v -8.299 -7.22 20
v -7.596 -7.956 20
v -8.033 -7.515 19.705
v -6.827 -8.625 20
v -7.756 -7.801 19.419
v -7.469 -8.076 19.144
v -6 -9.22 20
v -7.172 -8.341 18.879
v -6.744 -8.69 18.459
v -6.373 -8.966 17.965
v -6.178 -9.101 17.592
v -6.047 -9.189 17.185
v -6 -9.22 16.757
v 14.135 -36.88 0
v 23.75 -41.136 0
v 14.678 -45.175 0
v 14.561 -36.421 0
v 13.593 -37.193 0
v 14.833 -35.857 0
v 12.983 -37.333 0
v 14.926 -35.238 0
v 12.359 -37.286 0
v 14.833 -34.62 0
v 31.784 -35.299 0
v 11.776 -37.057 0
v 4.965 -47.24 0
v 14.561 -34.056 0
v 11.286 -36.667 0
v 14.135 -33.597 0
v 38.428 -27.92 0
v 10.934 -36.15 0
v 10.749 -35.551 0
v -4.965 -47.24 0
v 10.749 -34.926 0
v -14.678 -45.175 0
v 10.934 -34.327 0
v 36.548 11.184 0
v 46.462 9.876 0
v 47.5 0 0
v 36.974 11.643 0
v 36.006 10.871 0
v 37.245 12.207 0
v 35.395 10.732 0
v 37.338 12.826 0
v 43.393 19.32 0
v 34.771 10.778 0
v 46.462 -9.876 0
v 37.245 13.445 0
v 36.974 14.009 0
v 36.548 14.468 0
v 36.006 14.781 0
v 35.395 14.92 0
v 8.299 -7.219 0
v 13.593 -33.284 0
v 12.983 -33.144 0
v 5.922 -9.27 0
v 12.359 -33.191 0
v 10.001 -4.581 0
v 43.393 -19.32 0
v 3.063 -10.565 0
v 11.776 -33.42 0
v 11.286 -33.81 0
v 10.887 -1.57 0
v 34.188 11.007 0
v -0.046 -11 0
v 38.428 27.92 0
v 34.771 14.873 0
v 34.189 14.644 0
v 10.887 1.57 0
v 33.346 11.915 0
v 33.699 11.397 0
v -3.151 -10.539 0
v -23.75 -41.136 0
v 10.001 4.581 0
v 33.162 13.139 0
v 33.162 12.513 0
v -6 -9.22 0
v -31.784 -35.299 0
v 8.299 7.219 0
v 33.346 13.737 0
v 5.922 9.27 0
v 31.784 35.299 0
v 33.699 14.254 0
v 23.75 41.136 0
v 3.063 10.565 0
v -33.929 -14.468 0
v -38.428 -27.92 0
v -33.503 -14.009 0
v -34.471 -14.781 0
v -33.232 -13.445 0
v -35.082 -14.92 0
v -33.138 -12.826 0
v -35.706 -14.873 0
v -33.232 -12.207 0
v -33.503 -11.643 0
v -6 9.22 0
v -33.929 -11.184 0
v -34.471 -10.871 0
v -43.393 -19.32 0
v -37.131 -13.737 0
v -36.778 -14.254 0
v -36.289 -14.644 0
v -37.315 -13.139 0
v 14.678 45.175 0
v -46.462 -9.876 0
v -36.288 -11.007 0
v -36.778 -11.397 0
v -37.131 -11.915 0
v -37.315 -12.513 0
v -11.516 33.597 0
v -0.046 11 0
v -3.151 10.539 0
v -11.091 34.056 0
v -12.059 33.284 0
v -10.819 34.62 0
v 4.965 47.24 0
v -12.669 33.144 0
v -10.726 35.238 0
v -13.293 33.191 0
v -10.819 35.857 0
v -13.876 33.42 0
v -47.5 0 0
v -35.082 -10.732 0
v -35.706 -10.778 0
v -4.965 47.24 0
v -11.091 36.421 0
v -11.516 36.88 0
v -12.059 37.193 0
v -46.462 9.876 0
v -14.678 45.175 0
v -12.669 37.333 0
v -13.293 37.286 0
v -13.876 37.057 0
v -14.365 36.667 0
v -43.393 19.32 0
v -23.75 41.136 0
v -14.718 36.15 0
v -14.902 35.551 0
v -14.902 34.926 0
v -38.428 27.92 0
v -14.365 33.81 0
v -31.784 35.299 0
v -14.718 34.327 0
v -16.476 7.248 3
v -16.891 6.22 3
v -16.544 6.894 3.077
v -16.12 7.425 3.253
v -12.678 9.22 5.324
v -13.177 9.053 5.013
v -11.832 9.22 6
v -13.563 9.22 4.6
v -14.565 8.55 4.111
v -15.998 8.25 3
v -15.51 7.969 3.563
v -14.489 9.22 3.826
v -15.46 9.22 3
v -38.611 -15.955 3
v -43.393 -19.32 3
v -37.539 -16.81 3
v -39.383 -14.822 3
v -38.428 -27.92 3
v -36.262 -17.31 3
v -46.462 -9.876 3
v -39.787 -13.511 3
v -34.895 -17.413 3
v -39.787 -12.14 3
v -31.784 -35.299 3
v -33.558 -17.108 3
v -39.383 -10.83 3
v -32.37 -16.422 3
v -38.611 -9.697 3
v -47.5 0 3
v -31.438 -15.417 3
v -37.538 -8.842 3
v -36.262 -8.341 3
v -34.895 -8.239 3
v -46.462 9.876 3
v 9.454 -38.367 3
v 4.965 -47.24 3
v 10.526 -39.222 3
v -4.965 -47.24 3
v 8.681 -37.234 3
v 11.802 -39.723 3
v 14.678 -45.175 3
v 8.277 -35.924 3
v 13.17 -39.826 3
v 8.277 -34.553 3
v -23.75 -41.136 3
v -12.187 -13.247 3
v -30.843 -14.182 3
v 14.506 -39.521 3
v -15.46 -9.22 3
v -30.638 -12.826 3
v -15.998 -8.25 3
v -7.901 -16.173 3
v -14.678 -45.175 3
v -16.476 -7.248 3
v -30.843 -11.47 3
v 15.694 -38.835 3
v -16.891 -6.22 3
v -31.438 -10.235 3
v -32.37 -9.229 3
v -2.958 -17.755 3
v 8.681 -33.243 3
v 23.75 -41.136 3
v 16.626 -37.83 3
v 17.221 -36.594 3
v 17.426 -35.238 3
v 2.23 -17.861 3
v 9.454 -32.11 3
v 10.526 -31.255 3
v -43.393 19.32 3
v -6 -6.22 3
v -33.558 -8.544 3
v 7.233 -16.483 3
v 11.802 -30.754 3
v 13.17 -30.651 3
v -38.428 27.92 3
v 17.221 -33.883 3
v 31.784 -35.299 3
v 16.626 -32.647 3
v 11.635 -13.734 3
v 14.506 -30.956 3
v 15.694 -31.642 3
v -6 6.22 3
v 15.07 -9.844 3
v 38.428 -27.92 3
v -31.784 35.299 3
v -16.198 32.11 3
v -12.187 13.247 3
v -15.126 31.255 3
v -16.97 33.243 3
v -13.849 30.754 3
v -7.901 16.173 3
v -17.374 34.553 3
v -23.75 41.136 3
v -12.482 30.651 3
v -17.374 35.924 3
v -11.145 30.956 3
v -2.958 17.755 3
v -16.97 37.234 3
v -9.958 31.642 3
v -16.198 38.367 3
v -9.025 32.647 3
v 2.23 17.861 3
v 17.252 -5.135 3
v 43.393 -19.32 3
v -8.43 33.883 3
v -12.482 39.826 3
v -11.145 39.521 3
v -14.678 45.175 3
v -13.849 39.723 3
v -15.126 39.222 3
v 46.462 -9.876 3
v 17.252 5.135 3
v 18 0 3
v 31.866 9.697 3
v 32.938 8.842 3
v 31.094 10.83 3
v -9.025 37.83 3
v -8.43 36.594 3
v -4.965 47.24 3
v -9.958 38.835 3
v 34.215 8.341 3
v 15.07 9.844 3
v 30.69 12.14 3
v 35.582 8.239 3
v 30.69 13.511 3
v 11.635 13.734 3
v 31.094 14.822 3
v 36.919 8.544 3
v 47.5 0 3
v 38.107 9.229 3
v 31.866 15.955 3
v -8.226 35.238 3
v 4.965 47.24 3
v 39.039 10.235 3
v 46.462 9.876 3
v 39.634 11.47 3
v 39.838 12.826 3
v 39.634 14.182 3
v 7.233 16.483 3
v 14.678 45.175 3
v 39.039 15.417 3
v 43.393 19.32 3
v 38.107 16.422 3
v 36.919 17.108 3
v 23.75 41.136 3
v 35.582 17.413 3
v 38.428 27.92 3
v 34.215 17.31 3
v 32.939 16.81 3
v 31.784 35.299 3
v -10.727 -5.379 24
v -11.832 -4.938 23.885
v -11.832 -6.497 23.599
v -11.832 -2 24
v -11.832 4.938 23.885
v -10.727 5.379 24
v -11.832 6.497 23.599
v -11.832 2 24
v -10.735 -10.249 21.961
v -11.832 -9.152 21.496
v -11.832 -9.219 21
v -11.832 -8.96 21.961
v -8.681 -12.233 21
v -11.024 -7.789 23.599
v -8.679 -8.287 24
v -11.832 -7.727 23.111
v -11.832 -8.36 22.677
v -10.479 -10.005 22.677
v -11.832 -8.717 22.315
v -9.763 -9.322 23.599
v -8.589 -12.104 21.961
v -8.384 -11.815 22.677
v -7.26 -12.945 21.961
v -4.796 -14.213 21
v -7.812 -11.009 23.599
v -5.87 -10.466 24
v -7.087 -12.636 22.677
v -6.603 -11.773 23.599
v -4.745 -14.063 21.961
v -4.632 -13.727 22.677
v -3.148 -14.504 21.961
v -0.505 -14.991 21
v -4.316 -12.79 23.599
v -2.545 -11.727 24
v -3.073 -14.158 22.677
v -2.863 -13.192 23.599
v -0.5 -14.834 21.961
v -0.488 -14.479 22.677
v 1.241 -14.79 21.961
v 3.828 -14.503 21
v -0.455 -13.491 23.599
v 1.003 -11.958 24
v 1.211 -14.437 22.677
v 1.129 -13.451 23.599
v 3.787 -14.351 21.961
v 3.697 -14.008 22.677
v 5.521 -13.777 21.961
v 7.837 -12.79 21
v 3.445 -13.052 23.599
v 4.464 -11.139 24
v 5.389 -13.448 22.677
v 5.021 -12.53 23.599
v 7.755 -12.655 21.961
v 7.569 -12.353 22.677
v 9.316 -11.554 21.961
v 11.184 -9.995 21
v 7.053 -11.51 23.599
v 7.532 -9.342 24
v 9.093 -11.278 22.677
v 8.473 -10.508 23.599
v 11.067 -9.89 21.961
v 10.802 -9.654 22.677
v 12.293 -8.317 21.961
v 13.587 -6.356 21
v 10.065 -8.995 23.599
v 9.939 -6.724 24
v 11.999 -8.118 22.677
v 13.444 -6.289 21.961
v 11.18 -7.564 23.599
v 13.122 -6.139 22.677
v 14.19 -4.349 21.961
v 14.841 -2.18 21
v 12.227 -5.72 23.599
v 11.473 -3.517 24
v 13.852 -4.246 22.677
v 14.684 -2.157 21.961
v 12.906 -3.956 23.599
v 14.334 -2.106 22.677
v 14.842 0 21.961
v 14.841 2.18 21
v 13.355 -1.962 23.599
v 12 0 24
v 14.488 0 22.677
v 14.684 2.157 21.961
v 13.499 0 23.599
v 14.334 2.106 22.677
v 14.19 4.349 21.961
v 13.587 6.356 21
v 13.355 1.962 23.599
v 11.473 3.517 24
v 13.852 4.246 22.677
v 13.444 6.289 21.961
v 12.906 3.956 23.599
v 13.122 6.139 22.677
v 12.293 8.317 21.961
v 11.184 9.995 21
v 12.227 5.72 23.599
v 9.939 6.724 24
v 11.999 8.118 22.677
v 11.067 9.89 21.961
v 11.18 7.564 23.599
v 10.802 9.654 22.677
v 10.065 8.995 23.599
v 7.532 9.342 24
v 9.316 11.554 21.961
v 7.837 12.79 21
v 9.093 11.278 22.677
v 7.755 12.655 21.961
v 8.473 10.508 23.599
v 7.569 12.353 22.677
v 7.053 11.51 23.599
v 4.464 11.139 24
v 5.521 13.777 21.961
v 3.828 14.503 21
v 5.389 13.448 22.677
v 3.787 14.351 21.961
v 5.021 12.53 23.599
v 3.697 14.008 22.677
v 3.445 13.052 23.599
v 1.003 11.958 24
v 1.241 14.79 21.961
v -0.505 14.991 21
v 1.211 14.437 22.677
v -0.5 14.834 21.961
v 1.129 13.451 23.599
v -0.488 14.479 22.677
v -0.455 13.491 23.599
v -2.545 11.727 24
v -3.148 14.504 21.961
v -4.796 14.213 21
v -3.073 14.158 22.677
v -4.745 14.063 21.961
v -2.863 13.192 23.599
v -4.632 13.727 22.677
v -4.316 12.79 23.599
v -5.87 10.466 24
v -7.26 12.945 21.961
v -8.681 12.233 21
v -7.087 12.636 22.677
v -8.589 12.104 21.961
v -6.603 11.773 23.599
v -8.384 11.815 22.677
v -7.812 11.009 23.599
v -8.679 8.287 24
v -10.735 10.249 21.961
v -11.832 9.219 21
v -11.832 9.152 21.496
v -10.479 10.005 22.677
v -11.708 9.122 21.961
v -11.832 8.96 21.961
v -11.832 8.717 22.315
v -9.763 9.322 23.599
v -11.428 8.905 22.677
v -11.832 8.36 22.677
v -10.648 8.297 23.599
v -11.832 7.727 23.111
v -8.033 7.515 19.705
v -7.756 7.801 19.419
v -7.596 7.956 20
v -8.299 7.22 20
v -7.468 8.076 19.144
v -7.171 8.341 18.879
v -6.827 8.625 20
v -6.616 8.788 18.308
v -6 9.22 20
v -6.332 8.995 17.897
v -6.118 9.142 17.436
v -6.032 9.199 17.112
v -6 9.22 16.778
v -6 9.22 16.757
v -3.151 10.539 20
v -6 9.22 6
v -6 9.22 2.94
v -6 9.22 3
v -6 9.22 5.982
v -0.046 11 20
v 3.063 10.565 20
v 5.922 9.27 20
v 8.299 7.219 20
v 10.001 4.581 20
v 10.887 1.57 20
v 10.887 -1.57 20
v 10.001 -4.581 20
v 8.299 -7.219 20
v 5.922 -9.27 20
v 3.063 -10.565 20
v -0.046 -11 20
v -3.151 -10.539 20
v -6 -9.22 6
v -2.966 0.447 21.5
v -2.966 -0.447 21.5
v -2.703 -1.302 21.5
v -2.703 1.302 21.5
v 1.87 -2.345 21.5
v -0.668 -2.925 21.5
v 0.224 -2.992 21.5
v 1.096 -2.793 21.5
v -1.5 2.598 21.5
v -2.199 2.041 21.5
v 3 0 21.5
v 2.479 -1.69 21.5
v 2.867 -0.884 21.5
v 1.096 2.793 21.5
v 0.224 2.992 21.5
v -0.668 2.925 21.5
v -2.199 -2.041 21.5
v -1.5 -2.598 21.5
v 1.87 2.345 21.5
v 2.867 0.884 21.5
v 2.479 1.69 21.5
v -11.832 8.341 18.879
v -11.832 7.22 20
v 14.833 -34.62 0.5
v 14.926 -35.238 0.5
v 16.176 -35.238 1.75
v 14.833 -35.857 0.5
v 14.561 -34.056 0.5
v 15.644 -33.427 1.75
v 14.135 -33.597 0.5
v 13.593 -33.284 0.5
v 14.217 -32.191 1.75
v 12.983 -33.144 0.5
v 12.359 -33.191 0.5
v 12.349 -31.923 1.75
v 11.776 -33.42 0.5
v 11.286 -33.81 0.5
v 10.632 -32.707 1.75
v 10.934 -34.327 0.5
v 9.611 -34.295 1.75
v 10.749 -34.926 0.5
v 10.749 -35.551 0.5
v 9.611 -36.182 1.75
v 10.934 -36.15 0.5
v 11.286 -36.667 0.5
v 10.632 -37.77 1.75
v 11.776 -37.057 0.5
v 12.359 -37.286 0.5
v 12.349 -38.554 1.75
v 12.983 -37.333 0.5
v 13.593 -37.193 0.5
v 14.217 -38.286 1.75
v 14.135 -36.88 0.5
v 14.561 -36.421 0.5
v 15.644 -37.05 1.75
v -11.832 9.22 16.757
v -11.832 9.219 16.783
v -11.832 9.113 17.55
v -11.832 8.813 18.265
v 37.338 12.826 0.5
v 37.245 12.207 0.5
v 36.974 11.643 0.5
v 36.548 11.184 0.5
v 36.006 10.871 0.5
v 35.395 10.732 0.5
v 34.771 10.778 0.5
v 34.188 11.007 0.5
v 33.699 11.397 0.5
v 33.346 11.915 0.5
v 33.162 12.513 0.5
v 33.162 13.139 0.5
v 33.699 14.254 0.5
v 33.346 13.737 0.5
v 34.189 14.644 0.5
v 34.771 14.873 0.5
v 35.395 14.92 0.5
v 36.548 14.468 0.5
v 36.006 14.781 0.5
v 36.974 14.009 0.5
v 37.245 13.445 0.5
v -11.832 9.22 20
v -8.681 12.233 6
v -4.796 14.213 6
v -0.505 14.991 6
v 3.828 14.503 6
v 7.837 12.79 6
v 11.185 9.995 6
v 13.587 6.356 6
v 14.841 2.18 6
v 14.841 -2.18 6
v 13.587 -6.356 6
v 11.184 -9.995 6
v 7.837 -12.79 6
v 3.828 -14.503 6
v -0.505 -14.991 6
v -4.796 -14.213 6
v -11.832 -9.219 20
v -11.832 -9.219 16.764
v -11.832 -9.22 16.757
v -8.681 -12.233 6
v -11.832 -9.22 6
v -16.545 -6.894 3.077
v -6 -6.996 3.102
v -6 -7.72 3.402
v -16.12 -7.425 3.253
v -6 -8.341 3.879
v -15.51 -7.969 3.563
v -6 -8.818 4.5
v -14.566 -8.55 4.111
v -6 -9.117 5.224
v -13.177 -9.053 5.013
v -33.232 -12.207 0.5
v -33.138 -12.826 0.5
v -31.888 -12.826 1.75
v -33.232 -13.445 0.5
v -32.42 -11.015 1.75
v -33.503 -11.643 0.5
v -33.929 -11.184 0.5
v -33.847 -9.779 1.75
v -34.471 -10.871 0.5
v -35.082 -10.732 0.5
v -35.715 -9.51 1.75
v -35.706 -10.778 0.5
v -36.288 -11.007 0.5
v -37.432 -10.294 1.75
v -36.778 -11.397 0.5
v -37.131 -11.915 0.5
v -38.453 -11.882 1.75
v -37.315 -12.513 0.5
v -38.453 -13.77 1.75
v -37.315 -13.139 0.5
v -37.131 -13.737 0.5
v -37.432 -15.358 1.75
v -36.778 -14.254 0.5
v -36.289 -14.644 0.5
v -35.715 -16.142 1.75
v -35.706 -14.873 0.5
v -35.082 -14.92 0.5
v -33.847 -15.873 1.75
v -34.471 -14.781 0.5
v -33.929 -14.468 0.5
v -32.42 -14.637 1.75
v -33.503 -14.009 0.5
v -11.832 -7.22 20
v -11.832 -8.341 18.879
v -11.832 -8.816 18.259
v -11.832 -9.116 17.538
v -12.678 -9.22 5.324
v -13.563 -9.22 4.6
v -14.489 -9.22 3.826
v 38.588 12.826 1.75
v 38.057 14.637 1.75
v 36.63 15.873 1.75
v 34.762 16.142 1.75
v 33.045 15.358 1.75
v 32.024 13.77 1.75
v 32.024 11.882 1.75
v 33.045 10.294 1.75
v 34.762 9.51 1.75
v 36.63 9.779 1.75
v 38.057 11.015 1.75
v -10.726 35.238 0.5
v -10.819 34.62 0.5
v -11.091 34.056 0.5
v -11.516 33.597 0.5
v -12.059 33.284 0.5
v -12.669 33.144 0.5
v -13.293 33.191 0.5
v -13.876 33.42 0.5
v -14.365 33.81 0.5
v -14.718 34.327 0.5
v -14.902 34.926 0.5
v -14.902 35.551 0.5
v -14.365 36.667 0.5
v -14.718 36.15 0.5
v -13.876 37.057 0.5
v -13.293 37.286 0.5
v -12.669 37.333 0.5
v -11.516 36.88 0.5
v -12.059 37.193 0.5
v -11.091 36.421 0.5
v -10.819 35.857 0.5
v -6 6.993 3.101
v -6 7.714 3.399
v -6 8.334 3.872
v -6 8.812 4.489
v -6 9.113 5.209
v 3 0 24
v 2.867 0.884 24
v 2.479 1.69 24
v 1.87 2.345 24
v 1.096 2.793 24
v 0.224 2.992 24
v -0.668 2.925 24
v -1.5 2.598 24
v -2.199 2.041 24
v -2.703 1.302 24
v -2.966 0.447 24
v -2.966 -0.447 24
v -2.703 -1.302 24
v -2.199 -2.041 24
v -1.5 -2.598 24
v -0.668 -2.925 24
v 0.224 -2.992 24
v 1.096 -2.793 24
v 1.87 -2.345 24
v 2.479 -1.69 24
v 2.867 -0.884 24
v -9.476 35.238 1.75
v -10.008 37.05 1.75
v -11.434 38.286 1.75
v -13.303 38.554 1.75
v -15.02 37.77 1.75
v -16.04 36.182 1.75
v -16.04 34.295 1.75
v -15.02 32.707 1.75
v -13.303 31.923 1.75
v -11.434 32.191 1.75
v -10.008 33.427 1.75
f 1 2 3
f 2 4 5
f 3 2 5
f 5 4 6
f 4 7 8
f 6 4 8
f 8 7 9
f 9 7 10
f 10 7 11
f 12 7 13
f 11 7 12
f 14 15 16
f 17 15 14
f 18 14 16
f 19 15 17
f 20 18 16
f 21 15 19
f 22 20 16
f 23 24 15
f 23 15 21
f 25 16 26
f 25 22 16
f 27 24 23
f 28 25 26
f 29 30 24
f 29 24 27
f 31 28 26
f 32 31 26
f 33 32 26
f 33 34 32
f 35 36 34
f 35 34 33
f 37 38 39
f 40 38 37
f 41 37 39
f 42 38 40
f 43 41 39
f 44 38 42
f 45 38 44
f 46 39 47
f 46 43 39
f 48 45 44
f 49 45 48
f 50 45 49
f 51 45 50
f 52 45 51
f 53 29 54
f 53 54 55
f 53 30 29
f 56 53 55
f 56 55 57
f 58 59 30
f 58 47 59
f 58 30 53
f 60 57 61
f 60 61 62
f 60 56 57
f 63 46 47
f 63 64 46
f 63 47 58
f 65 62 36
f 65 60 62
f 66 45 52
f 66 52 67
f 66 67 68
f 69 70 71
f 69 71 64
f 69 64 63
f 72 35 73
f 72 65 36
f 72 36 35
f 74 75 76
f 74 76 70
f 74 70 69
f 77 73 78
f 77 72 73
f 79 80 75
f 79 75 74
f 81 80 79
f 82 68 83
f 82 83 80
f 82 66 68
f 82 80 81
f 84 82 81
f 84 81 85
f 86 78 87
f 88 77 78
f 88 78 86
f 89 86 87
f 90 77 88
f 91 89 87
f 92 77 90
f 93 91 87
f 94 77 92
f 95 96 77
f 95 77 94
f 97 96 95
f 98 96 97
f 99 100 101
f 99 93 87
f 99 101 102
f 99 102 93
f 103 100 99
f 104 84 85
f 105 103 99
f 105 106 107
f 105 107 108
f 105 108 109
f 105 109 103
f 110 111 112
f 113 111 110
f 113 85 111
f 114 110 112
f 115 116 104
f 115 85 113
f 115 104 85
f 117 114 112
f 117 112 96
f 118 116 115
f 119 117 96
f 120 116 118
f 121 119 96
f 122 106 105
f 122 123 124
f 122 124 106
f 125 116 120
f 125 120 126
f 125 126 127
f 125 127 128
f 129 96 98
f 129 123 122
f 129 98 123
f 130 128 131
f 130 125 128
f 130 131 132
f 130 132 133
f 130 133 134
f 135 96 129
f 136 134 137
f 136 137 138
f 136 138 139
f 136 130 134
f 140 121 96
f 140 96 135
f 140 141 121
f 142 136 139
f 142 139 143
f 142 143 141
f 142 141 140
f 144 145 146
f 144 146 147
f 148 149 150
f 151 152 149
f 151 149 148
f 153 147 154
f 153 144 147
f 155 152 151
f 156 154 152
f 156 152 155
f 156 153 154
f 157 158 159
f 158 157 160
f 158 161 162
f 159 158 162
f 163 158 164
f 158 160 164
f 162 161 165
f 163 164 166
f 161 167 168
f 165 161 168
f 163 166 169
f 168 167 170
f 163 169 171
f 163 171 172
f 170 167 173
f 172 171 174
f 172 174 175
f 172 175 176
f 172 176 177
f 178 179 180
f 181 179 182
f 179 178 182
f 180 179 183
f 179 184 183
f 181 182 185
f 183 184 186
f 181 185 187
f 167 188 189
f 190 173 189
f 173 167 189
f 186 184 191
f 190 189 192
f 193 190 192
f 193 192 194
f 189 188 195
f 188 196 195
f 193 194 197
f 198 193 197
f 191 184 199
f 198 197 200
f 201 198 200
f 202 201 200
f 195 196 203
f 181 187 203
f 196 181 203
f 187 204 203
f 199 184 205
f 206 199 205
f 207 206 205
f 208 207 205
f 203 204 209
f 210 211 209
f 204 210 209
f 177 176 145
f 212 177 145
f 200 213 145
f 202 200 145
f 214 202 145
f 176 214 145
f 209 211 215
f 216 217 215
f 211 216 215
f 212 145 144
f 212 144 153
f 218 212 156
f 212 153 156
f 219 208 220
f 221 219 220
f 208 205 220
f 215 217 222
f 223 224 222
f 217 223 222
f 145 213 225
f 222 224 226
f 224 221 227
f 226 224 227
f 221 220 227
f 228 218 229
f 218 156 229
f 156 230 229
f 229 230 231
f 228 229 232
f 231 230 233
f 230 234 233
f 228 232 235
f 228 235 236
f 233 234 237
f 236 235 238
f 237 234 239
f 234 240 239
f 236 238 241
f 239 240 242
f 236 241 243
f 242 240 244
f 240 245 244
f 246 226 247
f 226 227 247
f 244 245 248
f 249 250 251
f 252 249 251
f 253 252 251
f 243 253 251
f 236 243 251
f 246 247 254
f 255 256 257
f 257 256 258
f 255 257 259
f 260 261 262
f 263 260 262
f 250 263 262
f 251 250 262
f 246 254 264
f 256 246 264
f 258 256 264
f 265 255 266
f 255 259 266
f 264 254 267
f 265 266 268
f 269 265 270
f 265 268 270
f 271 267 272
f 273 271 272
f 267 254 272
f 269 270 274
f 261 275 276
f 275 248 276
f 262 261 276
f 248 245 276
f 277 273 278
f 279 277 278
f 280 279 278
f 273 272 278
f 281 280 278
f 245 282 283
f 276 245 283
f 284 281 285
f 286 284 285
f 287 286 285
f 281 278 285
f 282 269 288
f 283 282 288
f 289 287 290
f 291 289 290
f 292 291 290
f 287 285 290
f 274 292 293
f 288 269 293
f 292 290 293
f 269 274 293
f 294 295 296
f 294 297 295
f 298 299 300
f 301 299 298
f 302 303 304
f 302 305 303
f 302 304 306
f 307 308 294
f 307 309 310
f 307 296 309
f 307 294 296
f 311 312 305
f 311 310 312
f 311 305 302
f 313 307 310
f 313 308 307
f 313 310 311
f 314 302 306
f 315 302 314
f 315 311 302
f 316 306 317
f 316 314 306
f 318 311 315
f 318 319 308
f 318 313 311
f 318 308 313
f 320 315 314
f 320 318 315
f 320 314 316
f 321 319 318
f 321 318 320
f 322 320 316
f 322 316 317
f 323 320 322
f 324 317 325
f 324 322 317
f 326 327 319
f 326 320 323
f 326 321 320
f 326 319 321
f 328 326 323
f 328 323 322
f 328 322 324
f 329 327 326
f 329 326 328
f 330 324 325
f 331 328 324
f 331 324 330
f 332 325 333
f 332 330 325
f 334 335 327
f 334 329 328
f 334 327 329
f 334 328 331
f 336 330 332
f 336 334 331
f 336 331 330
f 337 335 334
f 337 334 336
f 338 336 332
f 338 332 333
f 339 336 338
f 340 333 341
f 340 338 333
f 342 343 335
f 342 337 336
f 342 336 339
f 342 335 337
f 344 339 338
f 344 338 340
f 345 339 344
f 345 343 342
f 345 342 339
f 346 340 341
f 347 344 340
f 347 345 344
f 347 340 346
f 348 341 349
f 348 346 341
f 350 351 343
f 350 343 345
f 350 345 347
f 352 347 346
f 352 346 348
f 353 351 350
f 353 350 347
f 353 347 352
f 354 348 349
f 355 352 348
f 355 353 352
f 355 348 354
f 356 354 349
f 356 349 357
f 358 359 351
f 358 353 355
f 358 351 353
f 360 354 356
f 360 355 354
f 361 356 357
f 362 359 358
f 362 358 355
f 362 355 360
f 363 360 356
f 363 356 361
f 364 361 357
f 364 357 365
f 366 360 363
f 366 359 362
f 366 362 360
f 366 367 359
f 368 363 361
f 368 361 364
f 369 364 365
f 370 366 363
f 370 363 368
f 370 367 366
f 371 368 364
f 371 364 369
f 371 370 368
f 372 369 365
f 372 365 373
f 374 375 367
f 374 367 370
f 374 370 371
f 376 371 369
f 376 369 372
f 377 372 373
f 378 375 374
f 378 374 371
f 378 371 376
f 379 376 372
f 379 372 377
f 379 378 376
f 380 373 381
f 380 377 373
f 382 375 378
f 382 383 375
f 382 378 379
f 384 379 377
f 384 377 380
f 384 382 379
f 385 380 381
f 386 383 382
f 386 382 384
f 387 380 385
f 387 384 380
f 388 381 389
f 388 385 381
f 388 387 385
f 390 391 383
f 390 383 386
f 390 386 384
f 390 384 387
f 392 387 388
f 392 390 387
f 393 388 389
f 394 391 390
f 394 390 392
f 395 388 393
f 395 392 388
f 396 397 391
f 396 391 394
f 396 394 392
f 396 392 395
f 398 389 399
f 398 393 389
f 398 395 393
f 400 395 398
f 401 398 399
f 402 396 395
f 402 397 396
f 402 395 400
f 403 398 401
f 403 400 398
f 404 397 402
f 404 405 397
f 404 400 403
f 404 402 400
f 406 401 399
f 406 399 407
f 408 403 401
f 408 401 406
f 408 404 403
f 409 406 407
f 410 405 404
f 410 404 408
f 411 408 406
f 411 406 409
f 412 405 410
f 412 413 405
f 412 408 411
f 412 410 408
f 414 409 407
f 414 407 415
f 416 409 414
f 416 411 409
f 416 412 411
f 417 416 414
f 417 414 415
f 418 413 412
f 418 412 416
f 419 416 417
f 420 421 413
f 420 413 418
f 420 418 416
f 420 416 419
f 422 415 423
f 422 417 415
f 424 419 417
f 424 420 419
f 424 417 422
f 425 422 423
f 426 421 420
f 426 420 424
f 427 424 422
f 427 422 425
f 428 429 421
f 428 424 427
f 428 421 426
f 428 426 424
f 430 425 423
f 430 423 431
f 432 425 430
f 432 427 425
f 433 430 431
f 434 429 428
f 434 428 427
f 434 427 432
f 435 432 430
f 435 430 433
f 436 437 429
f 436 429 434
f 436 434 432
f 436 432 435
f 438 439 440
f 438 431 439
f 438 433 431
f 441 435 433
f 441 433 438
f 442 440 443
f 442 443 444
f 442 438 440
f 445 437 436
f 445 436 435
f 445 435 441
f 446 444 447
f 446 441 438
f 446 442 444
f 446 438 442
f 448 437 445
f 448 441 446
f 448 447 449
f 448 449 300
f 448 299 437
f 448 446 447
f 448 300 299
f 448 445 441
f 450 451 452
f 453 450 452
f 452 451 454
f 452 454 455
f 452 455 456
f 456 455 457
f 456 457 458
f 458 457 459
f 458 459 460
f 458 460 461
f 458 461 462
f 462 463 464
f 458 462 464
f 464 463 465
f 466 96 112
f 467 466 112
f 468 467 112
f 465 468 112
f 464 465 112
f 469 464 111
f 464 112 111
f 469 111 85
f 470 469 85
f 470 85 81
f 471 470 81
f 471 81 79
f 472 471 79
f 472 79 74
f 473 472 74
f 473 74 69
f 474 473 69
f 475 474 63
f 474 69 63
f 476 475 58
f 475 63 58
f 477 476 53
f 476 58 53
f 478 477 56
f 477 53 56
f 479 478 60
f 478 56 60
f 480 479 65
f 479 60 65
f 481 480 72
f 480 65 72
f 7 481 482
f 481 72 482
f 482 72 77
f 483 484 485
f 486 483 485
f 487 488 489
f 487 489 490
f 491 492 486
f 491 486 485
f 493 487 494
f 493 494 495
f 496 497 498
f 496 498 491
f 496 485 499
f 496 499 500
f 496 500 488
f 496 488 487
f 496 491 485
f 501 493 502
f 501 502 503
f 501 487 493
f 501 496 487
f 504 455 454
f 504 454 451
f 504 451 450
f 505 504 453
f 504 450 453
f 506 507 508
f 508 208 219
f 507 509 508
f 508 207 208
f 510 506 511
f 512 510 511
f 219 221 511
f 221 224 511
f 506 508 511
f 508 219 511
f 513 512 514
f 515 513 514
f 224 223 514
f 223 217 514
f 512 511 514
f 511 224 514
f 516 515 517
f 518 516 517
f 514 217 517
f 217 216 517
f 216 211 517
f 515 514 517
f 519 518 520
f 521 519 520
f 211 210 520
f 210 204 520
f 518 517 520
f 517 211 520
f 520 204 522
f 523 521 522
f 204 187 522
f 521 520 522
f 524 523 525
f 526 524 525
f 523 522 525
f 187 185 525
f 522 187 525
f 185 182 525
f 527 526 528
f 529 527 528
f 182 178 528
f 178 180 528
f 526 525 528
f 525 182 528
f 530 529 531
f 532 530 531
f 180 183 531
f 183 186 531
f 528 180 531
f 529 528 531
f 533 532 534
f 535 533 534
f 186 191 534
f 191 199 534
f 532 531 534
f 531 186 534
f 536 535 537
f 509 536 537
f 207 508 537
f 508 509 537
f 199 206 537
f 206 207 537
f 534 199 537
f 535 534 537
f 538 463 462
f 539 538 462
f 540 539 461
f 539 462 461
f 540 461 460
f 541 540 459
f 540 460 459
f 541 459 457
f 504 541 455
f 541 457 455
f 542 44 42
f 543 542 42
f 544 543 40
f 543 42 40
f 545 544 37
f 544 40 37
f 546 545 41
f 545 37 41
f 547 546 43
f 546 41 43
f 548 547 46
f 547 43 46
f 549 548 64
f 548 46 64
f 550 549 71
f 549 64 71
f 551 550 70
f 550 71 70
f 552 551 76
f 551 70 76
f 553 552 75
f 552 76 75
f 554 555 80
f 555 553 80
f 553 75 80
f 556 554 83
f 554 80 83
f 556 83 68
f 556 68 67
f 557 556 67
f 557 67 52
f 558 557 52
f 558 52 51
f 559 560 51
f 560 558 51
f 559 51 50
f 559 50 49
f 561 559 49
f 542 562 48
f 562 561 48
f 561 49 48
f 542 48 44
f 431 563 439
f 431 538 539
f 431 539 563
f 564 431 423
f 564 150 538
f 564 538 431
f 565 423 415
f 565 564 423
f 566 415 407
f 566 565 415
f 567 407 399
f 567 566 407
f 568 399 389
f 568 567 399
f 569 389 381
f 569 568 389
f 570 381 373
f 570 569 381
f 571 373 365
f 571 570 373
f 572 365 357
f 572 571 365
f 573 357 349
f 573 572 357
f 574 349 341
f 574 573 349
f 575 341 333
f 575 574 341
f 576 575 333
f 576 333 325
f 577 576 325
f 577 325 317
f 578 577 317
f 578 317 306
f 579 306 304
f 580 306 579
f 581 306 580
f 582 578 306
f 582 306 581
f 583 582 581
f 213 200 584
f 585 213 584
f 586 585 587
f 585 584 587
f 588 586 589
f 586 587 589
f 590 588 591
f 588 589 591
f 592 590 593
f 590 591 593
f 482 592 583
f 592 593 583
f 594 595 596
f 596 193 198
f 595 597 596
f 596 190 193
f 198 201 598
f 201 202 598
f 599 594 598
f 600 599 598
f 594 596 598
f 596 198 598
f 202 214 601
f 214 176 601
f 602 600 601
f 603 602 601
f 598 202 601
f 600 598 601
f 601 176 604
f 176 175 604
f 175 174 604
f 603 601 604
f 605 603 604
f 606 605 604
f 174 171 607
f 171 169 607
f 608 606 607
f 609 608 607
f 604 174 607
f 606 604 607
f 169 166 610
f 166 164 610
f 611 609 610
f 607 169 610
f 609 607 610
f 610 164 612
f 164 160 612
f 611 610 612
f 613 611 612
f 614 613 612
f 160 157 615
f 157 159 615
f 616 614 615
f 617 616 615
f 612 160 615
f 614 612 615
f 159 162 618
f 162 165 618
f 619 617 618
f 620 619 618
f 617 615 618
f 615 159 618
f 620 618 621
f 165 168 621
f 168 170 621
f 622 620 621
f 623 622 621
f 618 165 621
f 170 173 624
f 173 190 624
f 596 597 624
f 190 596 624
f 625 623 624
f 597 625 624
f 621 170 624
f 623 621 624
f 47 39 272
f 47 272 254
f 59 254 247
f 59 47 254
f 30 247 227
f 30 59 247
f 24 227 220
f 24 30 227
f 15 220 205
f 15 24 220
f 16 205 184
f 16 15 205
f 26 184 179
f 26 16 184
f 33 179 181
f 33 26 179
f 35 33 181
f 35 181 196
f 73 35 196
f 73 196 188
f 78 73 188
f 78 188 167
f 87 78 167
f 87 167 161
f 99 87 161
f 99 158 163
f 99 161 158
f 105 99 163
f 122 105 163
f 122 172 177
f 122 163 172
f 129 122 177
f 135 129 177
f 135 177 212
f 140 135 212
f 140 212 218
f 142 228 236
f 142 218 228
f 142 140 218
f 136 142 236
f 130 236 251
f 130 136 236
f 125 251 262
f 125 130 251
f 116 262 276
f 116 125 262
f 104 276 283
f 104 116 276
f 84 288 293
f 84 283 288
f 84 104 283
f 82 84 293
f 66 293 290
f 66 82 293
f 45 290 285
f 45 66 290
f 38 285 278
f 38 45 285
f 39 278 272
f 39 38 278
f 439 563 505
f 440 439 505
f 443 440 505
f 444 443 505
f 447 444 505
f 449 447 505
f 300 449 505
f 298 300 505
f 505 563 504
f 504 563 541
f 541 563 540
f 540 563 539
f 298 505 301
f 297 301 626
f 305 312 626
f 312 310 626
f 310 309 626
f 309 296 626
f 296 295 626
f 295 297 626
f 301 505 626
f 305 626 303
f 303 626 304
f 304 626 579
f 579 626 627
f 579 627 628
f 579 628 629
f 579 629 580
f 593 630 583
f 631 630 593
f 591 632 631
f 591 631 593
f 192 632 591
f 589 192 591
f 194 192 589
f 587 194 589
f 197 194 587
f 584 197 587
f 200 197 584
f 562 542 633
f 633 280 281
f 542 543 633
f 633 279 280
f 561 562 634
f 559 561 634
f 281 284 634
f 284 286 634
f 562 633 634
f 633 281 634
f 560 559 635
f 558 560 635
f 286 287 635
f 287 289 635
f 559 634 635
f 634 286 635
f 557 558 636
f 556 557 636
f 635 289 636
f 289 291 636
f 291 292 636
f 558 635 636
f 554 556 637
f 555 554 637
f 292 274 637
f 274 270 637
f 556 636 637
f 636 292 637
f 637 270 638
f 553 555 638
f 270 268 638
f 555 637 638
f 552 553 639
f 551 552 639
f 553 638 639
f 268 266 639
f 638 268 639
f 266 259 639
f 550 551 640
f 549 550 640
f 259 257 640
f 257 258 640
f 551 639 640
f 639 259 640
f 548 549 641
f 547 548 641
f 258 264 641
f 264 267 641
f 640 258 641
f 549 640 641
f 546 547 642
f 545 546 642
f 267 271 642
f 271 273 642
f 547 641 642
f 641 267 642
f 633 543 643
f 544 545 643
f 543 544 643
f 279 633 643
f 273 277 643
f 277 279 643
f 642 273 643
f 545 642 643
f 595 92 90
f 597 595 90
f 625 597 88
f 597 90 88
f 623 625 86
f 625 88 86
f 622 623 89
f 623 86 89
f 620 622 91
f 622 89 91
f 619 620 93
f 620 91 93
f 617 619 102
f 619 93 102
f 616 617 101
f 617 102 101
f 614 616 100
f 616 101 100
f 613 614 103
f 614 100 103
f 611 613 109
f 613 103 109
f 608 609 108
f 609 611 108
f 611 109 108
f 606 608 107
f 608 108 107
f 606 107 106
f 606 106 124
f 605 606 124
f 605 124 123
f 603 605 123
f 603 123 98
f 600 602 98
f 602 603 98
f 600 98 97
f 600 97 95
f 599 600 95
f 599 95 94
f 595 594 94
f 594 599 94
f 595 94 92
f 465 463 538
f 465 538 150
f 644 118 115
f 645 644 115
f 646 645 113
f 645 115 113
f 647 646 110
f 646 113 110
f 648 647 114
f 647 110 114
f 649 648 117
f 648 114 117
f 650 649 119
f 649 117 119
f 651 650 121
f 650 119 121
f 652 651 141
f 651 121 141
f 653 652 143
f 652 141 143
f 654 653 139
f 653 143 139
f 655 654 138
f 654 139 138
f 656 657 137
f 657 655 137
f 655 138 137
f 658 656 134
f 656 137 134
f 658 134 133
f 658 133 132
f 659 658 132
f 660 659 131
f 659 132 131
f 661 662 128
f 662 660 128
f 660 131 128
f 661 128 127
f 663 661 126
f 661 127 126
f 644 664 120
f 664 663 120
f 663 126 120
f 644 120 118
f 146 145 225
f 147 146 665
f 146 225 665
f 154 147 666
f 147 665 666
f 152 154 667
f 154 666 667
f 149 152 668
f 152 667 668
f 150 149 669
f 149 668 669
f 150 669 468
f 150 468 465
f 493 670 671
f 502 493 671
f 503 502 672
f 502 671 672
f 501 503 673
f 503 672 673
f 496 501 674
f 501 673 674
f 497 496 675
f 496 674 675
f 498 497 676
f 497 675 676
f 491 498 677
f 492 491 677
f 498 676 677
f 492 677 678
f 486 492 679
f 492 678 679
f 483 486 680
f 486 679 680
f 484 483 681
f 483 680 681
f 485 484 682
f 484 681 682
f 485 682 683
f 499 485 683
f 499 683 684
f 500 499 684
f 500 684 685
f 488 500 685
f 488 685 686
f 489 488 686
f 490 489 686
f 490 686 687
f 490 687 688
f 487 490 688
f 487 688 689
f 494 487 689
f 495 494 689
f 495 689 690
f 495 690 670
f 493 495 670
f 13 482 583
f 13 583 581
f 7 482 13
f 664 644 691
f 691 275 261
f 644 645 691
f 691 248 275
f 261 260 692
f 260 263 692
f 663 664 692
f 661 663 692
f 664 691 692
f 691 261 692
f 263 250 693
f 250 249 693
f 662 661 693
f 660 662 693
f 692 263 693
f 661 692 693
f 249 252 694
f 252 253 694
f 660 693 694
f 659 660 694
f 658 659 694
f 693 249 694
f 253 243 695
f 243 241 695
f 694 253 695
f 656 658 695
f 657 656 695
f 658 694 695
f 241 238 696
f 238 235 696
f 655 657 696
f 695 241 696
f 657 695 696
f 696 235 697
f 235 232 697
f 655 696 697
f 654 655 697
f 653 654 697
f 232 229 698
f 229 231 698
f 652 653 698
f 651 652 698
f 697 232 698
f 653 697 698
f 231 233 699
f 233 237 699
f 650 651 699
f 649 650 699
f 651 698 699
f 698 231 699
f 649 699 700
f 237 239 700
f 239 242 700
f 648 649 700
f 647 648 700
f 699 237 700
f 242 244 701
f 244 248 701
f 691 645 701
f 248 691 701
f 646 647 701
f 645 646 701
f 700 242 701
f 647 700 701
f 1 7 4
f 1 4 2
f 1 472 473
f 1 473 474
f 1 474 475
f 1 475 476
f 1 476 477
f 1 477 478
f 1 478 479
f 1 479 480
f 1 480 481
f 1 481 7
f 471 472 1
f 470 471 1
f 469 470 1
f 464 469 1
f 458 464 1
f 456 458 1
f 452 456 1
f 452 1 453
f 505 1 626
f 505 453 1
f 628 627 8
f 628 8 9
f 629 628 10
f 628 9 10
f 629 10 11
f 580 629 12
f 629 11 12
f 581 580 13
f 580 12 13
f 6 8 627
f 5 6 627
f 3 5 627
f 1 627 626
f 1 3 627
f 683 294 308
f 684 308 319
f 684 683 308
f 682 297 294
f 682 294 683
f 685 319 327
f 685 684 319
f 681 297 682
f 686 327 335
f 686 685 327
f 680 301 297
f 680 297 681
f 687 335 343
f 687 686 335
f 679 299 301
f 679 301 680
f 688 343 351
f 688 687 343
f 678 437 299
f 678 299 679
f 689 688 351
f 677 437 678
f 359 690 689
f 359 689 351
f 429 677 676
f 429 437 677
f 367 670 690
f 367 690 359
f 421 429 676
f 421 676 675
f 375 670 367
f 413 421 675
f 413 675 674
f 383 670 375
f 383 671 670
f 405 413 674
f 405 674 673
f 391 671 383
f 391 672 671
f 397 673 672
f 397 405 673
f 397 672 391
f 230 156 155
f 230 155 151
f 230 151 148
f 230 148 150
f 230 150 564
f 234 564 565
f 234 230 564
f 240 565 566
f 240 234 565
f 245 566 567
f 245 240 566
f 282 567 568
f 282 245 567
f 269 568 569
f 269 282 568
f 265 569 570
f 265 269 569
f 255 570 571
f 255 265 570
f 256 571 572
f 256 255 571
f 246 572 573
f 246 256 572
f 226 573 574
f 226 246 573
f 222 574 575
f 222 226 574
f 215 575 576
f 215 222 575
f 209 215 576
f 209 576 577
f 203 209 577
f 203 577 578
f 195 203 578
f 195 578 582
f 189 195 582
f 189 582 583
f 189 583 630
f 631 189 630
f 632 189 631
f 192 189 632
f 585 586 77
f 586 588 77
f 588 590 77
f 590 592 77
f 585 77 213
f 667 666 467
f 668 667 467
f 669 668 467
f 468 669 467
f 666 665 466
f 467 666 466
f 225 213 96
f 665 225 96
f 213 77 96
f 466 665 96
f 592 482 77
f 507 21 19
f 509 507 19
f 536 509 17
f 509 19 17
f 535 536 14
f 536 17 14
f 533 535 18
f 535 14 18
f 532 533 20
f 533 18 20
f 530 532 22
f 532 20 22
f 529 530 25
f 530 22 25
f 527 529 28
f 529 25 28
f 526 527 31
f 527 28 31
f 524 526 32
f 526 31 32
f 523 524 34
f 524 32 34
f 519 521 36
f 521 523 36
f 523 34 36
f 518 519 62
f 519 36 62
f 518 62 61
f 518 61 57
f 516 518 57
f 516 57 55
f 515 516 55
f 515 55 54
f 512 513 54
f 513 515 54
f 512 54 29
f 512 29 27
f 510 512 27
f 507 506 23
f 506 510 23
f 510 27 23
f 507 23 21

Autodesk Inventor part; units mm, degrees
ref_plane "YZ Plane" through (0, 0, 0) normal (1, 0, 0) x (0, 1, 0)
ref_plane "XZ Plane" through (0, 0, 0) normal (0, 1, 0) x (-1, 0, 0)
ref_plane "XY Plane" through (0, 0, 0) normal (0, 0, 1) x (1, 0, 0)
sketch "Skizze1" plane through (0, 0, 0) normal (0, 0, 1) x (1, 0, 0)
  circle A0 centre (-35.2385, -12.8258) radius 2.1 projected
  circle A1 centre (-12.8258, 35.2385) radius 2.1 projected
  circle A2 centre (12.8258, -35.2385) radius 2.1 projected
  circle A3 centre (35.2385, 12.8258) radius 2.1 projected
  circle A4 centre (0, 0) radius 25 projected
  circle A5 centre (0, 0) radius 45 projected
  circle A6 centre (0, 0) radius 47.5 projected
  circle A7 centre (0, 0) radius 8.4675
  point P0 (0, 0)
extrude "Extrusion1" add sketch "Skizze1" along normal blind 3 contours A4 | A5 | A6 | A7
sketch "Skizze2" plane through (0, 0, 3) normal (0, 0, 1) x (1, 0, 0)
  circle A0 centre (0, 0) radius 15
  dimension "d2" = 30
extrude "Extrusion2" add sketch "Skizze2" along normal blind 21
sketch "Skizze3" plane through (0, 0, 24) normal (0, 0, 1) x (1, 0, 0)
  circle A0 centre (0, 0) radius 3
  dimension "d7" = 6
extrude "Extrusion3" cut sketch "Skizze3" against normal blind 2.5
sketch "Skizze4" plane through (0, 0, 0) normal (0, 0, -1) x (-1, 0, 0)
  circle A0 centre (0, 0) radius 15 projected
  circle A1 centre (0, 0) radius 11
  dimension "d8" = 4
extrude "Extrusion4" cut sketch "Skizze4" against normal blind 20 contours A1
sketch "Skizze5" plane through (0, 0, 0) normal (0, 0, -1) x (-1, 0, 0)
  circle A0 centre (0, 0) radius 11 projected
  circle A1 centre (-35.2385, 12.8258) radius 2.1 projected
  circle A2 centre (-12.8258, -35.2385) radius 2.1 projected
  circle A3 centre (12.8258, 35.2385) radius 2.1 projected
  circle A4 centre (35.2385, -12.8258) radius 2.1 projected
  circle A5 centre (0, 0) radius 47.5 projected
  line L0 (6, -9.2195) -> (6, 9.2195)
  dimension "d11" = 6
extrude "Extrusion5" add sketch "Skizze5" against normal up to surface (20 mm away) contours A0 L0 picked at (7.6667, 0)
sketch "Skizze6" plane through (-6, -9.2195, 0) normal (1, 0, 0) x (0, 0, -1)
  line L0 (-20, 0) -> (-20, 18.4391) projected
  line L1 (0, 0) -> (-20, 0) projected
  line L2 (0, 18.4391) -> (0, 0) projected
  line L3 (-20, 18.4391) -> (0, 18.4391) projected
  line L4 (-3, -5.7805) -> (-3, 24.2195) projected
  line L5 (-3, 19.9453) -> (-3, 24.1453) projected
  line L6 (-3, -28.1189) -> (-3, -23.9189) projected
  line L7 (-3, 42.358) -> (-3, 46.558) projected
  line L8 (-3, -5.7062) -> (-3, -1.5062) projected
  line L9 (-3, 56.7195) -> (-3, -38.2805) projected
  line L10 (-3, 0) -> (-20, 0)
  line L11 (-20, 0) -> (-20, 18.4391)
  line L12 (-20, 18.4391) -> (-3, 18.4391)
  line L13 (-3, 18.4391) -> (-3, 0)
  point P0 (0, 9.2195)
extrude "Extrusion6" cut sketch "Skizze6" against normal blind 20 contours L0 L3 L4 L1
sketch "Skizze7" plane through (0, 0, 20) normal (0, 0, -1) x (-1, 0, 0)
  arc A0 (6, 9.2195) -> (6, -9.2195) centre (0, 0) ccw projected
  line L0 (6, -9.2195) -> (11.8322, -9.2195) projected
  arc A1 (11.8322, -9.2195) -> (11.8322, 9.2195) centre (0, 0) ccw projected
  line L1 (6, 9.2195) -> (11.8322, 9.2195) projected
  line L2 (11.8322, 9.2195) -> (11.8322, -9.2195)
extrude "Extrusion7" cut sketch "Skizze7" against normal blind 20 contours A1 L2
chamfer "Fase1" distance 3 angle 45 1 edges at (15, 0, 3)
chamfer "Fase2" distance 2.5 angle 45 4 edges at (-14.9258, 35.2385, 3) (33.1385, 12.8258, 3) (10.7258, -35.2385, 3) (-37.3385, -12.8258, 3)
fillet "Rundung1" radius 3 2 edges at (-10.7298, 9.2195, 3) (-10.7298, -9.2195, 3)
chamfer "Fase3" distance 2 angle 45 2 edges at (-8.9161, 9.2195, 20) (-8.9161, -9.2195, 20)
fillet "Rundung2" radius 3 2 edges at (-8.9161, 9.2195, 18) (-8.9161, -9.2195, 18)
fillet "Rundung3" radius 3 1 edges at (15, 0, 24)
properties part number "OberArmMagnet" material "ABS-Kunststoff"
